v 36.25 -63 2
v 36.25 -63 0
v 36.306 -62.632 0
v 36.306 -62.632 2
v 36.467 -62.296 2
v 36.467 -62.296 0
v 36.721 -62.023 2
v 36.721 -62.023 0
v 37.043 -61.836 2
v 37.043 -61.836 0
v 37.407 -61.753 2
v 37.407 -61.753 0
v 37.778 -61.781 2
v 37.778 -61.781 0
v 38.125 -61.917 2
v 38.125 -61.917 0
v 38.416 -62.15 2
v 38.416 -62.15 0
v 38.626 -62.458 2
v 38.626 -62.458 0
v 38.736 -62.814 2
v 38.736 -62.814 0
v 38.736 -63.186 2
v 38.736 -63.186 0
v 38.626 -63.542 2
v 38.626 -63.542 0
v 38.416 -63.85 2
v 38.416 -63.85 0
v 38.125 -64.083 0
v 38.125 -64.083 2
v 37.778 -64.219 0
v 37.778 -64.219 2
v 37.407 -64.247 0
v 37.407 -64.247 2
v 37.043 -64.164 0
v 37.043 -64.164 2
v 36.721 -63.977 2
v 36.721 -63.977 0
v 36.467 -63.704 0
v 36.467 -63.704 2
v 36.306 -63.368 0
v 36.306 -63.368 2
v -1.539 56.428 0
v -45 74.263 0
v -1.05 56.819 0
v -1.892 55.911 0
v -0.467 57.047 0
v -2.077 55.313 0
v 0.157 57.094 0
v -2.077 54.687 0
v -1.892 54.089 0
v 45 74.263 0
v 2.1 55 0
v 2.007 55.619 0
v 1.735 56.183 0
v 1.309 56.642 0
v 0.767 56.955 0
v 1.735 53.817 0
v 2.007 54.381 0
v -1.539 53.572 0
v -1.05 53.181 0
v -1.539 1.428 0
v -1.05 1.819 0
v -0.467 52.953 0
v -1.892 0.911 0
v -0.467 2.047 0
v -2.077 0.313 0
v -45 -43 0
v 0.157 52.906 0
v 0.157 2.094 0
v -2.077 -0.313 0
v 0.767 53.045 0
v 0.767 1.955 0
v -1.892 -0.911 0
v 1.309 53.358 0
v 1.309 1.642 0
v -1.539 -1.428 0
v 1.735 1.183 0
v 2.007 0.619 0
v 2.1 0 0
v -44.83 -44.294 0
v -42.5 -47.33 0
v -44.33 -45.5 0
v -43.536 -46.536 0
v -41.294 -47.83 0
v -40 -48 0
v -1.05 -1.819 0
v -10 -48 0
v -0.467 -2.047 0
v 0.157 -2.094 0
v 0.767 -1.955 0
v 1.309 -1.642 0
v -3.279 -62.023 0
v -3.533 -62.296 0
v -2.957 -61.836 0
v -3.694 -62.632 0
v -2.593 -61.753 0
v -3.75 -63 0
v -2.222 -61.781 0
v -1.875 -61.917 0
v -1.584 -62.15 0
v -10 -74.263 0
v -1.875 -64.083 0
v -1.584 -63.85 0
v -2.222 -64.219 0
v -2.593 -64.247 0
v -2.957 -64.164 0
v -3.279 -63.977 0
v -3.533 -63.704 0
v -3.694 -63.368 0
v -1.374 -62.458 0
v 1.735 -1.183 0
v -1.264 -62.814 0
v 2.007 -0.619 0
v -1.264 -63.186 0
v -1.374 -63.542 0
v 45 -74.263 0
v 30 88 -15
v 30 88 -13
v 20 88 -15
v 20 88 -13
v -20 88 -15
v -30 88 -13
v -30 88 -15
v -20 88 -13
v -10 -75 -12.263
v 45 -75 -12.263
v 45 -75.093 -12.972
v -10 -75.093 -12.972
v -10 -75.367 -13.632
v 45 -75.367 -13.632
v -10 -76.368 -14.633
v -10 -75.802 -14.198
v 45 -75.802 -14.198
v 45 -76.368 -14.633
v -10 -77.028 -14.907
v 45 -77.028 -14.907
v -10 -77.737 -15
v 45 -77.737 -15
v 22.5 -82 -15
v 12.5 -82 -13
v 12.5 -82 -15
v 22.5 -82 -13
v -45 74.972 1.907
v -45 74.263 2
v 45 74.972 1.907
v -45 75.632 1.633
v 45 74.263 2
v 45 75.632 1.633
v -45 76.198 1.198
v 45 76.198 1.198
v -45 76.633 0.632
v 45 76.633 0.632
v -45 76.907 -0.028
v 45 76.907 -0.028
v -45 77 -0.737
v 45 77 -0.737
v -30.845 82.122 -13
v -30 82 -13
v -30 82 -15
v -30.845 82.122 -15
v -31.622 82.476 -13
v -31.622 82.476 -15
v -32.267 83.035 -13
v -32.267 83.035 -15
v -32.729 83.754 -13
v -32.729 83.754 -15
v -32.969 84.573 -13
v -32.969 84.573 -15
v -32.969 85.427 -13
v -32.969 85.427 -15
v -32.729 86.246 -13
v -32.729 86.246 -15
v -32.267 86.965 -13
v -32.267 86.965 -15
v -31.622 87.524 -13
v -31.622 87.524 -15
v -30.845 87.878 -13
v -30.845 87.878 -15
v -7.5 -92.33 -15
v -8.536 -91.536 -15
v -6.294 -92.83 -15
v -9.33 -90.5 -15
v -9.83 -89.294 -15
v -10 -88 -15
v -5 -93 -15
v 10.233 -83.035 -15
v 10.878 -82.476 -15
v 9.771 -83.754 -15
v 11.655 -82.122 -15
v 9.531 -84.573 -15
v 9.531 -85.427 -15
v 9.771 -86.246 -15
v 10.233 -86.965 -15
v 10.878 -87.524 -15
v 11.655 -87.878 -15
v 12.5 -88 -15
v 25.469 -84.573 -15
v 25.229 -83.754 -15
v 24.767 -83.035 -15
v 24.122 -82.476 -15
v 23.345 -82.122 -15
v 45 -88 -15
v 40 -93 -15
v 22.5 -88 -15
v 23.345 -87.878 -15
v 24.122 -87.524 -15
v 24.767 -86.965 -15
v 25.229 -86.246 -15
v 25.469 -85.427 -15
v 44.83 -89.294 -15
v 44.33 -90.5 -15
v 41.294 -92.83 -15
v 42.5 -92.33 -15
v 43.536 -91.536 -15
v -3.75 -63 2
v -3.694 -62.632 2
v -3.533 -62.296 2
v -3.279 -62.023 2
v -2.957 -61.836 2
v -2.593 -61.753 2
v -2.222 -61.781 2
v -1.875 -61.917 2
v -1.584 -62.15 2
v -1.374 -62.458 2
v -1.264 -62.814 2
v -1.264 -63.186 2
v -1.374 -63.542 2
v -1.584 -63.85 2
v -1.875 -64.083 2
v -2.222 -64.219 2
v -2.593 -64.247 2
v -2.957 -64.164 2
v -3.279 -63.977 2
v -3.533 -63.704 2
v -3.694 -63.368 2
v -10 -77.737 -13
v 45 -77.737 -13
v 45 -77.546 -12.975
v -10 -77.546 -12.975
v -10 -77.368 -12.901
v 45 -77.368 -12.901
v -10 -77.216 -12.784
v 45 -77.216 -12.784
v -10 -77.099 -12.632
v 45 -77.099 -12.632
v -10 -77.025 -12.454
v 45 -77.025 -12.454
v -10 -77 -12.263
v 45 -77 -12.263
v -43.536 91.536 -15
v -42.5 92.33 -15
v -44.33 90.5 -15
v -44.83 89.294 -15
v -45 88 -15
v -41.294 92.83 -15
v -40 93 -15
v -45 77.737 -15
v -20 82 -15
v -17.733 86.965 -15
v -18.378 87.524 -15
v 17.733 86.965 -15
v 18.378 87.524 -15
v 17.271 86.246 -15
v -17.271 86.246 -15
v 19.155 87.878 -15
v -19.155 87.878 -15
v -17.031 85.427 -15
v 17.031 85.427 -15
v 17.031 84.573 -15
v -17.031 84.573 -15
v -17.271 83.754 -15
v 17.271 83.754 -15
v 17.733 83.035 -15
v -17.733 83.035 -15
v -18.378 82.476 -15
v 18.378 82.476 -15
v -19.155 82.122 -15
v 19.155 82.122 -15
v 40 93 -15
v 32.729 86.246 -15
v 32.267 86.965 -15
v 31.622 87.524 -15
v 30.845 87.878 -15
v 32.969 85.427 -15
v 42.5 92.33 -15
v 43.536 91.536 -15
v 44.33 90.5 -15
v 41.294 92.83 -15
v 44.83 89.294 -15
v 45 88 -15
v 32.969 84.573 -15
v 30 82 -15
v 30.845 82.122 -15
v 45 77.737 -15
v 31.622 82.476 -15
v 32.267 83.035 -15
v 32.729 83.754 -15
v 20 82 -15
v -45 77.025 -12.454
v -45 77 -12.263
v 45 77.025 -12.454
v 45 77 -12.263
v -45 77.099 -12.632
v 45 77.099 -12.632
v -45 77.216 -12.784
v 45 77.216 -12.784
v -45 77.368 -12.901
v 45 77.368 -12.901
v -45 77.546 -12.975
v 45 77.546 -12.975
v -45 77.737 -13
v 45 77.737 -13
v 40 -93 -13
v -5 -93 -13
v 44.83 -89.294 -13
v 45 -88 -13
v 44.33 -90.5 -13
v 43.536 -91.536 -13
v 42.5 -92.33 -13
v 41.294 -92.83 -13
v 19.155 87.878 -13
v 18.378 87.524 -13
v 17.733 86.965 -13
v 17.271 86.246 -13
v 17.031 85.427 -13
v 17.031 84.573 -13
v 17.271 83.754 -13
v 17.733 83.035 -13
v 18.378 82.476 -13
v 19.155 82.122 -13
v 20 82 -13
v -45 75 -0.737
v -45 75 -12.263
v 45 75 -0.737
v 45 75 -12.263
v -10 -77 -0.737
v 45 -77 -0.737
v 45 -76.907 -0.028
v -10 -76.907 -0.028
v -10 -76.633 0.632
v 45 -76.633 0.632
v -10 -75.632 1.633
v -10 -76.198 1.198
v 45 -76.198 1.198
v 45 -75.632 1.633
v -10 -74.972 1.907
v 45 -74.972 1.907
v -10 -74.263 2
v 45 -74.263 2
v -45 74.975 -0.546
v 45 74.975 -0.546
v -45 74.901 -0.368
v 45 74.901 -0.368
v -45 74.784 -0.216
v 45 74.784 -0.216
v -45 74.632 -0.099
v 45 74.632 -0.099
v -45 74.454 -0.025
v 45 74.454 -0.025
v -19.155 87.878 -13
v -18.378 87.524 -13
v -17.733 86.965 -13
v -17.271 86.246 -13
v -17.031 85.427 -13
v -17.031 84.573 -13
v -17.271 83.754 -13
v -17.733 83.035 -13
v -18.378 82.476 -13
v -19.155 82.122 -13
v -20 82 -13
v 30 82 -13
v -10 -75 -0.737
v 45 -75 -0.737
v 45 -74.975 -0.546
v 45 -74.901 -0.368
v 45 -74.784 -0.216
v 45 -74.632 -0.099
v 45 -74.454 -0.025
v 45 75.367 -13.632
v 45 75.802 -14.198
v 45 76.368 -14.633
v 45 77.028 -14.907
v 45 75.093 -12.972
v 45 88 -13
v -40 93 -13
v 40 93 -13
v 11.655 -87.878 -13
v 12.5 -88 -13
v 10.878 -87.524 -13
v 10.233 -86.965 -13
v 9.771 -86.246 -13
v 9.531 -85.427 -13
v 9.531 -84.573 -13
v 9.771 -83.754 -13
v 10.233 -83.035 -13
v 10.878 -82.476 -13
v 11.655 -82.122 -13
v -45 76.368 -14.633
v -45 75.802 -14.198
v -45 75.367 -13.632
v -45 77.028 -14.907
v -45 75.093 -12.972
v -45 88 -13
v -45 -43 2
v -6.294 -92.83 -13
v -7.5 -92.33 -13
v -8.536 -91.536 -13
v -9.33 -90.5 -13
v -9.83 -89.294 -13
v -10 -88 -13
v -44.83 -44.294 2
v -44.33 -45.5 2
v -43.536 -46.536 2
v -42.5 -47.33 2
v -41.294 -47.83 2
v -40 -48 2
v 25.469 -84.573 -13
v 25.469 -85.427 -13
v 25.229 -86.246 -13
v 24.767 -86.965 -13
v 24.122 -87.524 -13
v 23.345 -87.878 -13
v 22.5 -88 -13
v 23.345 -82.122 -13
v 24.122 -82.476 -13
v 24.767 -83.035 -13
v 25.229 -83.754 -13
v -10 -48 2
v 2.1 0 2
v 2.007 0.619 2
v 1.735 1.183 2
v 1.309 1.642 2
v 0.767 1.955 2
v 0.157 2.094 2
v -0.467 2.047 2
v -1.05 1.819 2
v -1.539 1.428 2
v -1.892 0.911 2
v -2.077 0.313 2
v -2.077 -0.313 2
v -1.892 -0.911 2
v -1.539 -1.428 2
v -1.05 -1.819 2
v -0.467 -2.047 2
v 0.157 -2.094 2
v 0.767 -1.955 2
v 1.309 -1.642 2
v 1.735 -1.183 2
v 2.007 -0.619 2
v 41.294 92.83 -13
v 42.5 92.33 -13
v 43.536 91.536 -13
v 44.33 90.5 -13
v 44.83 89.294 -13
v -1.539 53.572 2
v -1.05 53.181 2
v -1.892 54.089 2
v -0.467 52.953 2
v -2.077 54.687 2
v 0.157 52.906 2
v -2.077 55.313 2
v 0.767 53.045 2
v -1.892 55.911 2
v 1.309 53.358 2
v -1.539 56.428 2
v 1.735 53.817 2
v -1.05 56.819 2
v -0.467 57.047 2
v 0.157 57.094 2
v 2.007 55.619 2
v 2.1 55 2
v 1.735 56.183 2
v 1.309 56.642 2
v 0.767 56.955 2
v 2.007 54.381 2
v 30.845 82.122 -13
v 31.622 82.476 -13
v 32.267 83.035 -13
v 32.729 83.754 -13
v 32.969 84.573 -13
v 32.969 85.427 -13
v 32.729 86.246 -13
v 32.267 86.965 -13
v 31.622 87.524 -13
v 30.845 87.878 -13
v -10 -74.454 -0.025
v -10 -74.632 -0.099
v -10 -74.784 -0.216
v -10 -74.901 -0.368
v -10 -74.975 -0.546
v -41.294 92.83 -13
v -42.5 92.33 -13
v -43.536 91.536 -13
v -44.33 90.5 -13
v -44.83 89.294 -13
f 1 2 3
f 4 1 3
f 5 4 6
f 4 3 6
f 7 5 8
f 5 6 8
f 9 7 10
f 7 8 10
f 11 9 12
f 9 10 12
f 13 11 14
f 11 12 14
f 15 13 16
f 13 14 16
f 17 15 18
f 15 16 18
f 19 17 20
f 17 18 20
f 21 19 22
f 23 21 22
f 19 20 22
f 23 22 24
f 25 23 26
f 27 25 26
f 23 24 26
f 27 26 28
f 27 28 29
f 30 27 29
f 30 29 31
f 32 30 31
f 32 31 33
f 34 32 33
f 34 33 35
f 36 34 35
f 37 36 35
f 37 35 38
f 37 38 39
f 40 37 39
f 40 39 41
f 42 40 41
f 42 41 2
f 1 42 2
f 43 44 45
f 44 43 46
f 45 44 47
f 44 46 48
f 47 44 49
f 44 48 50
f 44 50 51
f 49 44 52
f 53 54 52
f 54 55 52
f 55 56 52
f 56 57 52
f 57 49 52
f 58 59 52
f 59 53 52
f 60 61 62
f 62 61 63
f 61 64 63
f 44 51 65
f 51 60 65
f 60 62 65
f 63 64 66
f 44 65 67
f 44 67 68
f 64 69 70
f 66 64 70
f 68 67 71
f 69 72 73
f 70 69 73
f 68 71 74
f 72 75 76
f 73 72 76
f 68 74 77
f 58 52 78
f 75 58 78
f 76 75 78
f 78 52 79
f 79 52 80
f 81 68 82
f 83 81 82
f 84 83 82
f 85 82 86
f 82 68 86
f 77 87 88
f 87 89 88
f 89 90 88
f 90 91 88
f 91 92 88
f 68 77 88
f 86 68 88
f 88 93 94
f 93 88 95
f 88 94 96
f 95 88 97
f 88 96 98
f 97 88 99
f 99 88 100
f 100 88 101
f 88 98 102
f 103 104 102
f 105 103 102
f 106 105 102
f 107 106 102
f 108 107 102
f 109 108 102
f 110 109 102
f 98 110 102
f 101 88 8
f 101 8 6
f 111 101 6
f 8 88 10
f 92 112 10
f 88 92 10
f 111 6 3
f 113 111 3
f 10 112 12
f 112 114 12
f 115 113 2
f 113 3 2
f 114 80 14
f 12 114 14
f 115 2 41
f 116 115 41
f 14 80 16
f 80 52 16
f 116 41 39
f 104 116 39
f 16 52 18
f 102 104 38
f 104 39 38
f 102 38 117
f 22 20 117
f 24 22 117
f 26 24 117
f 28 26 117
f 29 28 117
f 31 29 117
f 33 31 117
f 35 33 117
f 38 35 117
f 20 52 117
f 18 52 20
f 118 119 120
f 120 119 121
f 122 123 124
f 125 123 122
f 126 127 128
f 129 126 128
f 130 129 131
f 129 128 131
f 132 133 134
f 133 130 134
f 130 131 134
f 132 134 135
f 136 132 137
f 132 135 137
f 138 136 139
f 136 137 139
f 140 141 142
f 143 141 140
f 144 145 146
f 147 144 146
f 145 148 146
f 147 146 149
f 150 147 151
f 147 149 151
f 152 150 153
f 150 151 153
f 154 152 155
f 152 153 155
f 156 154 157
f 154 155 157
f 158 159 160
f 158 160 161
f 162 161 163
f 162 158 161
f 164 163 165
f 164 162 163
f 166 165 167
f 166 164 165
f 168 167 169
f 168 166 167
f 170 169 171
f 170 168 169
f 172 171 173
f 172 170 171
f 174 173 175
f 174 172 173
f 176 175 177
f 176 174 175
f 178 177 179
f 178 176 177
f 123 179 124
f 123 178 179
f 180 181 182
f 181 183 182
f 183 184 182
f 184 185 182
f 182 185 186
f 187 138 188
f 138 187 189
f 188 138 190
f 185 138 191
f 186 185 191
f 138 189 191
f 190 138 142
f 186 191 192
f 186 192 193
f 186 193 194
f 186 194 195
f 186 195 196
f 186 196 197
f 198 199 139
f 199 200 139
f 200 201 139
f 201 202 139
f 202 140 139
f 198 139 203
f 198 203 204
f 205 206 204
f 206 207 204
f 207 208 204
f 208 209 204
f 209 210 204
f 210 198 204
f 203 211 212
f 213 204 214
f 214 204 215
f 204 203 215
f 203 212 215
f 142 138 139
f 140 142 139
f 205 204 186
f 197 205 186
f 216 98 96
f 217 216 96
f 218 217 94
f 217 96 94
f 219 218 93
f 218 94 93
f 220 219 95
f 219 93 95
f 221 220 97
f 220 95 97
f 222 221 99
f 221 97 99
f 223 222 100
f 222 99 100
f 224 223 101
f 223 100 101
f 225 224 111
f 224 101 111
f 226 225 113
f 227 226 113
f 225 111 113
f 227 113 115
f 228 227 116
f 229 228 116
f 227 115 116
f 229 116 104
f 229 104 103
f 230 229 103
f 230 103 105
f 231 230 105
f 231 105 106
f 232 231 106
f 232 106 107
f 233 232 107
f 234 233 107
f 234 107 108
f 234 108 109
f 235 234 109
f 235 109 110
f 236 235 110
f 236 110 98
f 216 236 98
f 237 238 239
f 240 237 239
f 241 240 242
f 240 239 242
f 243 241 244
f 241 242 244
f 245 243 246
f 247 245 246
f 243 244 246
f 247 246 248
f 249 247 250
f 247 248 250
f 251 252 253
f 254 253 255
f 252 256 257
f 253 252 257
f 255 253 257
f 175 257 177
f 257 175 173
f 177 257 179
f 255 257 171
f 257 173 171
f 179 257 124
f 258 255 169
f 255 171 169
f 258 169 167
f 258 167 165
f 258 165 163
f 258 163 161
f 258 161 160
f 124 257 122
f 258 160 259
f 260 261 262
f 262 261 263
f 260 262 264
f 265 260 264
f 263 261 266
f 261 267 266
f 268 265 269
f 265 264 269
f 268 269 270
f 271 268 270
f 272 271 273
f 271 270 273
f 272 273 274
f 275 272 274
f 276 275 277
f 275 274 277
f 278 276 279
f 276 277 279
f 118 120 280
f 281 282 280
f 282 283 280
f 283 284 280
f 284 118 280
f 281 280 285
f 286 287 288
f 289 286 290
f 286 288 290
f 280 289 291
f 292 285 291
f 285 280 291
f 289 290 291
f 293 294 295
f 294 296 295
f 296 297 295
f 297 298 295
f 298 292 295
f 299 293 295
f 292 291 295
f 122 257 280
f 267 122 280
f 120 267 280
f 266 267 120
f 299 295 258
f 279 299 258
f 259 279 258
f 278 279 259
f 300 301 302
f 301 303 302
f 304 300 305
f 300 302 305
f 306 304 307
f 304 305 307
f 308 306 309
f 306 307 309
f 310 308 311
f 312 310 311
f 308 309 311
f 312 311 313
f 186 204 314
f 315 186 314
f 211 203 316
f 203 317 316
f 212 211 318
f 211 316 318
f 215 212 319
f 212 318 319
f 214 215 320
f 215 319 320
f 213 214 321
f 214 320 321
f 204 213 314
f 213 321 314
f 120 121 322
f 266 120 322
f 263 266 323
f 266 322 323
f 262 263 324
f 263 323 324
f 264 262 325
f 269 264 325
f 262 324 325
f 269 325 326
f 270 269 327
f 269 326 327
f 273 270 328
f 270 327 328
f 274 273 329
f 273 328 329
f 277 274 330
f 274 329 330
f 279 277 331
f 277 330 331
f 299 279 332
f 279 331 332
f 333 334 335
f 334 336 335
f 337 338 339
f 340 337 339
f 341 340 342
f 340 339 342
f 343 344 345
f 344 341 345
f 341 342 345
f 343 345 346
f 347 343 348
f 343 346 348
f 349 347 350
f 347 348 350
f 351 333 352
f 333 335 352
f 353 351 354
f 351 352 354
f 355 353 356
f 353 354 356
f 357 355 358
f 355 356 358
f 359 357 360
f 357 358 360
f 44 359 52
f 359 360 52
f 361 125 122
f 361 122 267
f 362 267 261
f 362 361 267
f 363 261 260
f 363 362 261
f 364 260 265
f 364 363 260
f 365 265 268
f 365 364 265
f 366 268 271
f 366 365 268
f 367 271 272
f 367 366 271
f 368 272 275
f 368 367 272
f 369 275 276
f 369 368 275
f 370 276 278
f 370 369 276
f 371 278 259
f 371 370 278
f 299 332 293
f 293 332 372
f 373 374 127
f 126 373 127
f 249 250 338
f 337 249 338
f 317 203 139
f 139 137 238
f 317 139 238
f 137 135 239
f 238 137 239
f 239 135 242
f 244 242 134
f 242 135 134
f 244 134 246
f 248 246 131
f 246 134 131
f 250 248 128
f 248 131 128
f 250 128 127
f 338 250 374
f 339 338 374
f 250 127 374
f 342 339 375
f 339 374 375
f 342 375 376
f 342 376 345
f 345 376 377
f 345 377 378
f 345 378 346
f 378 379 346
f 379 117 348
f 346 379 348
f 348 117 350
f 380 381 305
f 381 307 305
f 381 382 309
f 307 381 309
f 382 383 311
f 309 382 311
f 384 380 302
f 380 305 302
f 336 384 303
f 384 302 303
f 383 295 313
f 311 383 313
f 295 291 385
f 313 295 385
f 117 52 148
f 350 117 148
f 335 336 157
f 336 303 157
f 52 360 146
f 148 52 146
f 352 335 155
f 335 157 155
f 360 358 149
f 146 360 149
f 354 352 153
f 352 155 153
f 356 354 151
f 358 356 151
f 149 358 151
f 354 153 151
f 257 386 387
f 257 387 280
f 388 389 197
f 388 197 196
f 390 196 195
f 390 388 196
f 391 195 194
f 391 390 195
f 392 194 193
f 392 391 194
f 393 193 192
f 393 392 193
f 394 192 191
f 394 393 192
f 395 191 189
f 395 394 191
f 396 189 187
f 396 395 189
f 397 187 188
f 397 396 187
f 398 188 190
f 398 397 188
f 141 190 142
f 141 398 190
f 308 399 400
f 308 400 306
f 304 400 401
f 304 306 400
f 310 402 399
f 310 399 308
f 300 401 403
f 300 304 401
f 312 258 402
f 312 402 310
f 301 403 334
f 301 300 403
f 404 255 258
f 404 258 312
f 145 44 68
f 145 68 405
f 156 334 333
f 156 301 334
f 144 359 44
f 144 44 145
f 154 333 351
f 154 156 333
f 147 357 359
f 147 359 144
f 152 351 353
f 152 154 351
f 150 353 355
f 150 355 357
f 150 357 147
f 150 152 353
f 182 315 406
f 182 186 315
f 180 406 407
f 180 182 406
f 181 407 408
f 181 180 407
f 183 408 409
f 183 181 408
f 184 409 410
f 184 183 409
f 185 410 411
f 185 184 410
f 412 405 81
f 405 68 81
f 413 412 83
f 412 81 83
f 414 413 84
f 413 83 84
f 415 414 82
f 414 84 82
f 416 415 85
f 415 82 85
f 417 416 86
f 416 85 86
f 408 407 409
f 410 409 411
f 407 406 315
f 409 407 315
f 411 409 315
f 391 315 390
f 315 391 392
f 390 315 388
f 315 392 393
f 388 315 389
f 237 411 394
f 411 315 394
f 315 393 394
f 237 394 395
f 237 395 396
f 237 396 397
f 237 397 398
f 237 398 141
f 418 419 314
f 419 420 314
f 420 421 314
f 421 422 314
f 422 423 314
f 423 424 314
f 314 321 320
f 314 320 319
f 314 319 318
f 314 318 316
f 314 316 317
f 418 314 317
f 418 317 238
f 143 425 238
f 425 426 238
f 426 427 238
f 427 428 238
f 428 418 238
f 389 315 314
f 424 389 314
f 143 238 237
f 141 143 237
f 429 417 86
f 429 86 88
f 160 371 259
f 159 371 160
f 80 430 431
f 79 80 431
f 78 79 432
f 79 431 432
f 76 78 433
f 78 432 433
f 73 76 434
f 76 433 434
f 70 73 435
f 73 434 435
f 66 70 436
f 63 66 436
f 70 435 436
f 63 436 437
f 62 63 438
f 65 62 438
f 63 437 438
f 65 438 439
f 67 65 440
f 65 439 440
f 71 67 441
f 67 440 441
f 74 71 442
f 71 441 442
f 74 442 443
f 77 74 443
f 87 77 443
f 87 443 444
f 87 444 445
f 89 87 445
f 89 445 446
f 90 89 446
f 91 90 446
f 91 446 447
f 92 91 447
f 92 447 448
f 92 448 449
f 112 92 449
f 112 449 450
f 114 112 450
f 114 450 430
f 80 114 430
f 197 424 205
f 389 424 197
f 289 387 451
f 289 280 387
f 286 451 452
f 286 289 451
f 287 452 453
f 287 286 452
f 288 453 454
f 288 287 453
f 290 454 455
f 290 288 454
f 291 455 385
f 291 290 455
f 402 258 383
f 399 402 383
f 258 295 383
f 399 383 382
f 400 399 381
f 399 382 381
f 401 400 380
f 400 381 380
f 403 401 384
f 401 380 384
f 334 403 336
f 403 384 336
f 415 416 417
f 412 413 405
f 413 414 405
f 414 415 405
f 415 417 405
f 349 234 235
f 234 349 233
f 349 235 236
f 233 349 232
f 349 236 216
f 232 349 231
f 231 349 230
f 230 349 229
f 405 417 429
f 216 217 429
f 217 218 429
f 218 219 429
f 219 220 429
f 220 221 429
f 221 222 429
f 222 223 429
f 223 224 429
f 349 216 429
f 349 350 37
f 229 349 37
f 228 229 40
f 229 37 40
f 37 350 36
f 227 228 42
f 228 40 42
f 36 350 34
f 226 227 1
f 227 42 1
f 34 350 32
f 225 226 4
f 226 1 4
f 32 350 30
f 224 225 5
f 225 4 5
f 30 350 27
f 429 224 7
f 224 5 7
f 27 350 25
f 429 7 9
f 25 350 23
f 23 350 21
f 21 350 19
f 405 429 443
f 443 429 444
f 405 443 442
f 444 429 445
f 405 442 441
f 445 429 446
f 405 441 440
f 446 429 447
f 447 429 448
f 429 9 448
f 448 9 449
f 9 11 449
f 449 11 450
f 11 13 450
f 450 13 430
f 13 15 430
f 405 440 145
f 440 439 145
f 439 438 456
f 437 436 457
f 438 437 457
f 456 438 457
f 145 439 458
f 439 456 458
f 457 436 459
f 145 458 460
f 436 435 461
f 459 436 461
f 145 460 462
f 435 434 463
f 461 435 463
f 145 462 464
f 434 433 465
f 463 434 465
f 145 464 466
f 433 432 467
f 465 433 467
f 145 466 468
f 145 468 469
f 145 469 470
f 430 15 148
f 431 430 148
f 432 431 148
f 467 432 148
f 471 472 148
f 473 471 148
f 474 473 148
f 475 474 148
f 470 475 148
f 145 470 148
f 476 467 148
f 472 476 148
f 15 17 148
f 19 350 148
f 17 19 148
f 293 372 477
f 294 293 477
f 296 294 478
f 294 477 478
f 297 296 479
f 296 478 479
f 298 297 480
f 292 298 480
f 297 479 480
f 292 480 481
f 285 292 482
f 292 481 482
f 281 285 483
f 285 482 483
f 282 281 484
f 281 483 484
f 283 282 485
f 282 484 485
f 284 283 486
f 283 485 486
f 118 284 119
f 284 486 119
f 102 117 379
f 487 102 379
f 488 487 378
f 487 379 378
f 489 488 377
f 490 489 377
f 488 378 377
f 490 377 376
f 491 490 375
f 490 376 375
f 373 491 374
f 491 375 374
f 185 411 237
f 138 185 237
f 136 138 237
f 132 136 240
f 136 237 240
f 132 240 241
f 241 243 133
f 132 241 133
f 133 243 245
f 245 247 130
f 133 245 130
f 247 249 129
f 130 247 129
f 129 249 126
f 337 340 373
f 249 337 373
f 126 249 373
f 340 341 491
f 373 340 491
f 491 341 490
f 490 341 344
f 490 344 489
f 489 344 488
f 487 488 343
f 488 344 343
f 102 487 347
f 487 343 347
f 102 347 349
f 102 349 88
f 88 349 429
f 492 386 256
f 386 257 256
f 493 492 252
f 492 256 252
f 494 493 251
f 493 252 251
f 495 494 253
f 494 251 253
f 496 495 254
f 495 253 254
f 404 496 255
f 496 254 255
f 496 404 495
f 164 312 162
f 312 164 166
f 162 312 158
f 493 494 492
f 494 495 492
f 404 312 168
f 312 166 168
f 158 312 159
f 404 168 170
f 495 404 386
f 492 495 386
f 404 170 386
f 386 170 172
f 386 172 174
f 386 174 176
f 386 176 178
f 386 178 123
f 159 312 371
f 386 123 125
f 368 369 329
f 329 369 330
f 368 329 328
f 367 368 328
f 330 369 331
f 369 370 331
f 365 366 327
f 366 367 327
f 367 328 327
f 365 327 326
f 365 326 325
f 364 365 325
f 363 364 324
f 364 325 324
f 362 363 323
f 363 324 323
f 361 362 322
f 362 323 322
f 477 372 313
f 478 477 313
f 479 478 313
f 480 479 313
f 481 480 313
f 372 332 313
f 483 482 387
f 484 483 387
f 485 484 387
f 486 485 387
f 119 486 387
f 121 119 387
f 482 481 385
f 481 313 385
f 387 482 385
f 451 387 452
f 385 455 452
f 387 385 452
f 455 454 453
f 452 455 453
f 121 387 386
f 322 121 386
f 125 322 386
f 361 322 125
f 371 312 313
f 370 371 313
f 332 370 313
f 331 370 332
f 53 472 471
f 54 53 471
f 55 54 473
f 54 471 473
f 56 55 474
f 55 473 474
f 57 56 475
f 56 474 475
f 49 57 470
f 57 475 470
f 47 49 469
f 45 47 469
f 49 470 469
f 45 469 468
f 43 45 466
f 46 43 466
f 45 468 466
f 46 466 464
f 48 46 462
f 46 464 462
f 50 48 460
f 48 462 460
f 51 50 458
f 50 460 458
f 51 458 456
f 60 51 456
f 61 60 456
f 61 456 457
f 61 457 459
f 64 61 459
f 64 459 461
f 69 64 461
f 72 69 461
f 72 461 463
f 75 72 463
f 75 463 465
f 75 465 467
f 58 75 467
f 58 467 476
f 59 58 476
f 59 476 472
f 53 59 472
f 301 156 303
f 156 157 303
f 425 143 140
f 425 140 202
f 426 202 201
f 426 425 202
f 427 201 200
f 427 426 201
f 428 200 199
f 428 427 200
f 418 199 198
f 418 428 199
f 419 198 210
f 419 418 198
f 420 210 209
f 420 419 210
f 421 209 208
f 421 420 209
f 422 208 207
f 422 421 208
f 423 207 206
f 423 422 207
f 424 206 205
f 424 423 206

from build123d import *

# Parameters (mm, degrees)
SM_BASE_FLANGE_1_DEPTH = 45
SKETCH_3_R             = 2.1
CUT_EXTRUDE_1_DEPTH    = 105.70434566
SKETCH_4_W             = 35
SKETCH_4_H             = 45
CUT_EXTRUDE_2_DEPTH    = 105.70434566
M3X0_5_1_D             = 2.5
M3X0_5_1_DEPTH         = 7.5
M3X0_5_1_TIP           = 0.751075774
CUT_EXTRUDE_3_DEPTH    = 105.398275848
FILLET_1_R             = 5


# Sheet-metal steps are written as plain solids
with BuildPart() as part:
    # Sketch 1 → 基体-法兰1 (new, symmetric)
    with BuildSketch(Plane(origin=(0, 0, 0), x_dir=(0, 0, -1), z_dir=(1, 0, 0))):
        with BuildLine():
            Line((15, 93), (15, 77.7366))
            ThreePointArc((15, 77.7366), (14.198468417, 75.801531583), (12.2634, 75))
            Line((12.2634, 75), (0.7366, 75))
            ThreePointArc((0.7366, 75), (0.215745145, 74.784254855), (0, 74.2634))
            Line((0, 74.2634), (0, -74.2634))
            ThreePointArc((0, -74.2634), (0.215745145, -74.784254855), (0.7366, -75))
            Line((0.7366, -75), (12.2634, -75))
            ThreePointArc((12.2634, -75), (14.198468417, -75.801531583), (15, -77.7366))
            Line((15, -77.7366), (15, -93))
            Line((15, -93), (13, -93))
            Line((13, -93), (13, -77.7366))
            ThreePointArc((13, -77.7366), (12.784254855, -77.215745145), (12.2634, -77))
            Line((12.2634, -77), (0.7366, -77))
            ThreePointArc((0.7366, -77), (-1.198468417, -76.198468417), (-2, -74.2634))
            Line((-2, -74.2634), (-2, 74.2634))
            ThreePointArc((-2, 74.2634), (-1.198468417, 76.198468417), (0.7366, 77))
            Line((0.7366, 77), (12.2634, 77))
            ThreePointArc((12.2634, 77), (12.784254855, 77.215745145), (13, 77.7366))
            Line((13, 77.7366), (13, 93))
            Line((13, 93), (15, 93))
        make_face()
    extrude(amount=SM_BASE_FLANGE_1_DEPTH, both=True)

    # 草图3 → 切除-拉伸1 (cut, through all)
    with BuildSketch(Plane.XY.offset(2)):
        with Locations((0, 55)):
            Circle(SKETCH_3_R)
        Circle(SKETCH_3_R)
    extrude(amount=-CUT_EXTRUDE_1_DEPTH, mode=Mode.SUBTRACT)

    # 草图4 → 切除-拉伸2 (cut, through all)
    with BuildSketch(Plane.XY.offset(2)):
        with Locations((-27.5, -70.5)):
            Rectangle(SKETCH_4_W, SKETCH_4_H)
    extrude(amount=-CUT_EXTRUDE_2_DEPTH, mode=Mode.SUBTRACT)

    # M3x0.5 螺纹孔1
    with Locations(Plane.XY.offset(2)):
        with Locations((-2.5, -63), (37.5, -63)):
            Hole(M3X0_5_1_D / 2, depth=M3X0_5_1_DEPTH)
            with Locations((0, 0, -(M3X0_5_1_DEPTH + M3X0_5_1_TIP / 2))):  # 118° drill point
                Cone(0, M3X0_5_1_D / 2, M3X0_5_1_TIP, mode=Mode.SUBTRACT)

    # 草图7 → 切除-拉伸3 (cut, through all)
    with BuildSketch(Plane.XY.offset(-13)):
        with BuildLine():
            Line((-30, 88), (-20, 88))
            ThreePointArc((-20, 88), (-17, 85), (-20, 82))
            Line((-20, 82), (-30, 82))
            ThreePointArc((-30, 82), (-33, 85), (-30, 88))
        make_face()
        with BuildLine():
            Line((30, 88), (20, 88))
            ThreePointArc((20, 88), (17, 85), (20, 82))
            Line((20, 82), (30, 82))
            ThreePointArc((30, 82), (33, 85), (30, 88))
        make_face()
        with BuildLine():
            Line((12.5, -82), (22.5, -82))
            ThreePointArc((22.5, -82), (25.5, -85), (22.5, -88))
            Line((22.5, -88), (12.5, -88))
            ThreePointArc((12.5, -88), (9.5, -85), (12.5, -82))
        make_face()
    extrude(amount=-CUT_EXTRUDE_3_DEPTH, mode=Mode.SUBTRACT)

    # 圆角1
    fillet_1_edges = [part.edges().sort_by_distance(p)[0] for p in [
        (-45, 93, -14),
        (45, -93, -14),
        (45, 93, -14),
        (-45, -48, 1),
        (-10, -93, -14),
    ]]
    fillet(fillet_1_edges, radius=FILLET_1_R)


solid = part.part
